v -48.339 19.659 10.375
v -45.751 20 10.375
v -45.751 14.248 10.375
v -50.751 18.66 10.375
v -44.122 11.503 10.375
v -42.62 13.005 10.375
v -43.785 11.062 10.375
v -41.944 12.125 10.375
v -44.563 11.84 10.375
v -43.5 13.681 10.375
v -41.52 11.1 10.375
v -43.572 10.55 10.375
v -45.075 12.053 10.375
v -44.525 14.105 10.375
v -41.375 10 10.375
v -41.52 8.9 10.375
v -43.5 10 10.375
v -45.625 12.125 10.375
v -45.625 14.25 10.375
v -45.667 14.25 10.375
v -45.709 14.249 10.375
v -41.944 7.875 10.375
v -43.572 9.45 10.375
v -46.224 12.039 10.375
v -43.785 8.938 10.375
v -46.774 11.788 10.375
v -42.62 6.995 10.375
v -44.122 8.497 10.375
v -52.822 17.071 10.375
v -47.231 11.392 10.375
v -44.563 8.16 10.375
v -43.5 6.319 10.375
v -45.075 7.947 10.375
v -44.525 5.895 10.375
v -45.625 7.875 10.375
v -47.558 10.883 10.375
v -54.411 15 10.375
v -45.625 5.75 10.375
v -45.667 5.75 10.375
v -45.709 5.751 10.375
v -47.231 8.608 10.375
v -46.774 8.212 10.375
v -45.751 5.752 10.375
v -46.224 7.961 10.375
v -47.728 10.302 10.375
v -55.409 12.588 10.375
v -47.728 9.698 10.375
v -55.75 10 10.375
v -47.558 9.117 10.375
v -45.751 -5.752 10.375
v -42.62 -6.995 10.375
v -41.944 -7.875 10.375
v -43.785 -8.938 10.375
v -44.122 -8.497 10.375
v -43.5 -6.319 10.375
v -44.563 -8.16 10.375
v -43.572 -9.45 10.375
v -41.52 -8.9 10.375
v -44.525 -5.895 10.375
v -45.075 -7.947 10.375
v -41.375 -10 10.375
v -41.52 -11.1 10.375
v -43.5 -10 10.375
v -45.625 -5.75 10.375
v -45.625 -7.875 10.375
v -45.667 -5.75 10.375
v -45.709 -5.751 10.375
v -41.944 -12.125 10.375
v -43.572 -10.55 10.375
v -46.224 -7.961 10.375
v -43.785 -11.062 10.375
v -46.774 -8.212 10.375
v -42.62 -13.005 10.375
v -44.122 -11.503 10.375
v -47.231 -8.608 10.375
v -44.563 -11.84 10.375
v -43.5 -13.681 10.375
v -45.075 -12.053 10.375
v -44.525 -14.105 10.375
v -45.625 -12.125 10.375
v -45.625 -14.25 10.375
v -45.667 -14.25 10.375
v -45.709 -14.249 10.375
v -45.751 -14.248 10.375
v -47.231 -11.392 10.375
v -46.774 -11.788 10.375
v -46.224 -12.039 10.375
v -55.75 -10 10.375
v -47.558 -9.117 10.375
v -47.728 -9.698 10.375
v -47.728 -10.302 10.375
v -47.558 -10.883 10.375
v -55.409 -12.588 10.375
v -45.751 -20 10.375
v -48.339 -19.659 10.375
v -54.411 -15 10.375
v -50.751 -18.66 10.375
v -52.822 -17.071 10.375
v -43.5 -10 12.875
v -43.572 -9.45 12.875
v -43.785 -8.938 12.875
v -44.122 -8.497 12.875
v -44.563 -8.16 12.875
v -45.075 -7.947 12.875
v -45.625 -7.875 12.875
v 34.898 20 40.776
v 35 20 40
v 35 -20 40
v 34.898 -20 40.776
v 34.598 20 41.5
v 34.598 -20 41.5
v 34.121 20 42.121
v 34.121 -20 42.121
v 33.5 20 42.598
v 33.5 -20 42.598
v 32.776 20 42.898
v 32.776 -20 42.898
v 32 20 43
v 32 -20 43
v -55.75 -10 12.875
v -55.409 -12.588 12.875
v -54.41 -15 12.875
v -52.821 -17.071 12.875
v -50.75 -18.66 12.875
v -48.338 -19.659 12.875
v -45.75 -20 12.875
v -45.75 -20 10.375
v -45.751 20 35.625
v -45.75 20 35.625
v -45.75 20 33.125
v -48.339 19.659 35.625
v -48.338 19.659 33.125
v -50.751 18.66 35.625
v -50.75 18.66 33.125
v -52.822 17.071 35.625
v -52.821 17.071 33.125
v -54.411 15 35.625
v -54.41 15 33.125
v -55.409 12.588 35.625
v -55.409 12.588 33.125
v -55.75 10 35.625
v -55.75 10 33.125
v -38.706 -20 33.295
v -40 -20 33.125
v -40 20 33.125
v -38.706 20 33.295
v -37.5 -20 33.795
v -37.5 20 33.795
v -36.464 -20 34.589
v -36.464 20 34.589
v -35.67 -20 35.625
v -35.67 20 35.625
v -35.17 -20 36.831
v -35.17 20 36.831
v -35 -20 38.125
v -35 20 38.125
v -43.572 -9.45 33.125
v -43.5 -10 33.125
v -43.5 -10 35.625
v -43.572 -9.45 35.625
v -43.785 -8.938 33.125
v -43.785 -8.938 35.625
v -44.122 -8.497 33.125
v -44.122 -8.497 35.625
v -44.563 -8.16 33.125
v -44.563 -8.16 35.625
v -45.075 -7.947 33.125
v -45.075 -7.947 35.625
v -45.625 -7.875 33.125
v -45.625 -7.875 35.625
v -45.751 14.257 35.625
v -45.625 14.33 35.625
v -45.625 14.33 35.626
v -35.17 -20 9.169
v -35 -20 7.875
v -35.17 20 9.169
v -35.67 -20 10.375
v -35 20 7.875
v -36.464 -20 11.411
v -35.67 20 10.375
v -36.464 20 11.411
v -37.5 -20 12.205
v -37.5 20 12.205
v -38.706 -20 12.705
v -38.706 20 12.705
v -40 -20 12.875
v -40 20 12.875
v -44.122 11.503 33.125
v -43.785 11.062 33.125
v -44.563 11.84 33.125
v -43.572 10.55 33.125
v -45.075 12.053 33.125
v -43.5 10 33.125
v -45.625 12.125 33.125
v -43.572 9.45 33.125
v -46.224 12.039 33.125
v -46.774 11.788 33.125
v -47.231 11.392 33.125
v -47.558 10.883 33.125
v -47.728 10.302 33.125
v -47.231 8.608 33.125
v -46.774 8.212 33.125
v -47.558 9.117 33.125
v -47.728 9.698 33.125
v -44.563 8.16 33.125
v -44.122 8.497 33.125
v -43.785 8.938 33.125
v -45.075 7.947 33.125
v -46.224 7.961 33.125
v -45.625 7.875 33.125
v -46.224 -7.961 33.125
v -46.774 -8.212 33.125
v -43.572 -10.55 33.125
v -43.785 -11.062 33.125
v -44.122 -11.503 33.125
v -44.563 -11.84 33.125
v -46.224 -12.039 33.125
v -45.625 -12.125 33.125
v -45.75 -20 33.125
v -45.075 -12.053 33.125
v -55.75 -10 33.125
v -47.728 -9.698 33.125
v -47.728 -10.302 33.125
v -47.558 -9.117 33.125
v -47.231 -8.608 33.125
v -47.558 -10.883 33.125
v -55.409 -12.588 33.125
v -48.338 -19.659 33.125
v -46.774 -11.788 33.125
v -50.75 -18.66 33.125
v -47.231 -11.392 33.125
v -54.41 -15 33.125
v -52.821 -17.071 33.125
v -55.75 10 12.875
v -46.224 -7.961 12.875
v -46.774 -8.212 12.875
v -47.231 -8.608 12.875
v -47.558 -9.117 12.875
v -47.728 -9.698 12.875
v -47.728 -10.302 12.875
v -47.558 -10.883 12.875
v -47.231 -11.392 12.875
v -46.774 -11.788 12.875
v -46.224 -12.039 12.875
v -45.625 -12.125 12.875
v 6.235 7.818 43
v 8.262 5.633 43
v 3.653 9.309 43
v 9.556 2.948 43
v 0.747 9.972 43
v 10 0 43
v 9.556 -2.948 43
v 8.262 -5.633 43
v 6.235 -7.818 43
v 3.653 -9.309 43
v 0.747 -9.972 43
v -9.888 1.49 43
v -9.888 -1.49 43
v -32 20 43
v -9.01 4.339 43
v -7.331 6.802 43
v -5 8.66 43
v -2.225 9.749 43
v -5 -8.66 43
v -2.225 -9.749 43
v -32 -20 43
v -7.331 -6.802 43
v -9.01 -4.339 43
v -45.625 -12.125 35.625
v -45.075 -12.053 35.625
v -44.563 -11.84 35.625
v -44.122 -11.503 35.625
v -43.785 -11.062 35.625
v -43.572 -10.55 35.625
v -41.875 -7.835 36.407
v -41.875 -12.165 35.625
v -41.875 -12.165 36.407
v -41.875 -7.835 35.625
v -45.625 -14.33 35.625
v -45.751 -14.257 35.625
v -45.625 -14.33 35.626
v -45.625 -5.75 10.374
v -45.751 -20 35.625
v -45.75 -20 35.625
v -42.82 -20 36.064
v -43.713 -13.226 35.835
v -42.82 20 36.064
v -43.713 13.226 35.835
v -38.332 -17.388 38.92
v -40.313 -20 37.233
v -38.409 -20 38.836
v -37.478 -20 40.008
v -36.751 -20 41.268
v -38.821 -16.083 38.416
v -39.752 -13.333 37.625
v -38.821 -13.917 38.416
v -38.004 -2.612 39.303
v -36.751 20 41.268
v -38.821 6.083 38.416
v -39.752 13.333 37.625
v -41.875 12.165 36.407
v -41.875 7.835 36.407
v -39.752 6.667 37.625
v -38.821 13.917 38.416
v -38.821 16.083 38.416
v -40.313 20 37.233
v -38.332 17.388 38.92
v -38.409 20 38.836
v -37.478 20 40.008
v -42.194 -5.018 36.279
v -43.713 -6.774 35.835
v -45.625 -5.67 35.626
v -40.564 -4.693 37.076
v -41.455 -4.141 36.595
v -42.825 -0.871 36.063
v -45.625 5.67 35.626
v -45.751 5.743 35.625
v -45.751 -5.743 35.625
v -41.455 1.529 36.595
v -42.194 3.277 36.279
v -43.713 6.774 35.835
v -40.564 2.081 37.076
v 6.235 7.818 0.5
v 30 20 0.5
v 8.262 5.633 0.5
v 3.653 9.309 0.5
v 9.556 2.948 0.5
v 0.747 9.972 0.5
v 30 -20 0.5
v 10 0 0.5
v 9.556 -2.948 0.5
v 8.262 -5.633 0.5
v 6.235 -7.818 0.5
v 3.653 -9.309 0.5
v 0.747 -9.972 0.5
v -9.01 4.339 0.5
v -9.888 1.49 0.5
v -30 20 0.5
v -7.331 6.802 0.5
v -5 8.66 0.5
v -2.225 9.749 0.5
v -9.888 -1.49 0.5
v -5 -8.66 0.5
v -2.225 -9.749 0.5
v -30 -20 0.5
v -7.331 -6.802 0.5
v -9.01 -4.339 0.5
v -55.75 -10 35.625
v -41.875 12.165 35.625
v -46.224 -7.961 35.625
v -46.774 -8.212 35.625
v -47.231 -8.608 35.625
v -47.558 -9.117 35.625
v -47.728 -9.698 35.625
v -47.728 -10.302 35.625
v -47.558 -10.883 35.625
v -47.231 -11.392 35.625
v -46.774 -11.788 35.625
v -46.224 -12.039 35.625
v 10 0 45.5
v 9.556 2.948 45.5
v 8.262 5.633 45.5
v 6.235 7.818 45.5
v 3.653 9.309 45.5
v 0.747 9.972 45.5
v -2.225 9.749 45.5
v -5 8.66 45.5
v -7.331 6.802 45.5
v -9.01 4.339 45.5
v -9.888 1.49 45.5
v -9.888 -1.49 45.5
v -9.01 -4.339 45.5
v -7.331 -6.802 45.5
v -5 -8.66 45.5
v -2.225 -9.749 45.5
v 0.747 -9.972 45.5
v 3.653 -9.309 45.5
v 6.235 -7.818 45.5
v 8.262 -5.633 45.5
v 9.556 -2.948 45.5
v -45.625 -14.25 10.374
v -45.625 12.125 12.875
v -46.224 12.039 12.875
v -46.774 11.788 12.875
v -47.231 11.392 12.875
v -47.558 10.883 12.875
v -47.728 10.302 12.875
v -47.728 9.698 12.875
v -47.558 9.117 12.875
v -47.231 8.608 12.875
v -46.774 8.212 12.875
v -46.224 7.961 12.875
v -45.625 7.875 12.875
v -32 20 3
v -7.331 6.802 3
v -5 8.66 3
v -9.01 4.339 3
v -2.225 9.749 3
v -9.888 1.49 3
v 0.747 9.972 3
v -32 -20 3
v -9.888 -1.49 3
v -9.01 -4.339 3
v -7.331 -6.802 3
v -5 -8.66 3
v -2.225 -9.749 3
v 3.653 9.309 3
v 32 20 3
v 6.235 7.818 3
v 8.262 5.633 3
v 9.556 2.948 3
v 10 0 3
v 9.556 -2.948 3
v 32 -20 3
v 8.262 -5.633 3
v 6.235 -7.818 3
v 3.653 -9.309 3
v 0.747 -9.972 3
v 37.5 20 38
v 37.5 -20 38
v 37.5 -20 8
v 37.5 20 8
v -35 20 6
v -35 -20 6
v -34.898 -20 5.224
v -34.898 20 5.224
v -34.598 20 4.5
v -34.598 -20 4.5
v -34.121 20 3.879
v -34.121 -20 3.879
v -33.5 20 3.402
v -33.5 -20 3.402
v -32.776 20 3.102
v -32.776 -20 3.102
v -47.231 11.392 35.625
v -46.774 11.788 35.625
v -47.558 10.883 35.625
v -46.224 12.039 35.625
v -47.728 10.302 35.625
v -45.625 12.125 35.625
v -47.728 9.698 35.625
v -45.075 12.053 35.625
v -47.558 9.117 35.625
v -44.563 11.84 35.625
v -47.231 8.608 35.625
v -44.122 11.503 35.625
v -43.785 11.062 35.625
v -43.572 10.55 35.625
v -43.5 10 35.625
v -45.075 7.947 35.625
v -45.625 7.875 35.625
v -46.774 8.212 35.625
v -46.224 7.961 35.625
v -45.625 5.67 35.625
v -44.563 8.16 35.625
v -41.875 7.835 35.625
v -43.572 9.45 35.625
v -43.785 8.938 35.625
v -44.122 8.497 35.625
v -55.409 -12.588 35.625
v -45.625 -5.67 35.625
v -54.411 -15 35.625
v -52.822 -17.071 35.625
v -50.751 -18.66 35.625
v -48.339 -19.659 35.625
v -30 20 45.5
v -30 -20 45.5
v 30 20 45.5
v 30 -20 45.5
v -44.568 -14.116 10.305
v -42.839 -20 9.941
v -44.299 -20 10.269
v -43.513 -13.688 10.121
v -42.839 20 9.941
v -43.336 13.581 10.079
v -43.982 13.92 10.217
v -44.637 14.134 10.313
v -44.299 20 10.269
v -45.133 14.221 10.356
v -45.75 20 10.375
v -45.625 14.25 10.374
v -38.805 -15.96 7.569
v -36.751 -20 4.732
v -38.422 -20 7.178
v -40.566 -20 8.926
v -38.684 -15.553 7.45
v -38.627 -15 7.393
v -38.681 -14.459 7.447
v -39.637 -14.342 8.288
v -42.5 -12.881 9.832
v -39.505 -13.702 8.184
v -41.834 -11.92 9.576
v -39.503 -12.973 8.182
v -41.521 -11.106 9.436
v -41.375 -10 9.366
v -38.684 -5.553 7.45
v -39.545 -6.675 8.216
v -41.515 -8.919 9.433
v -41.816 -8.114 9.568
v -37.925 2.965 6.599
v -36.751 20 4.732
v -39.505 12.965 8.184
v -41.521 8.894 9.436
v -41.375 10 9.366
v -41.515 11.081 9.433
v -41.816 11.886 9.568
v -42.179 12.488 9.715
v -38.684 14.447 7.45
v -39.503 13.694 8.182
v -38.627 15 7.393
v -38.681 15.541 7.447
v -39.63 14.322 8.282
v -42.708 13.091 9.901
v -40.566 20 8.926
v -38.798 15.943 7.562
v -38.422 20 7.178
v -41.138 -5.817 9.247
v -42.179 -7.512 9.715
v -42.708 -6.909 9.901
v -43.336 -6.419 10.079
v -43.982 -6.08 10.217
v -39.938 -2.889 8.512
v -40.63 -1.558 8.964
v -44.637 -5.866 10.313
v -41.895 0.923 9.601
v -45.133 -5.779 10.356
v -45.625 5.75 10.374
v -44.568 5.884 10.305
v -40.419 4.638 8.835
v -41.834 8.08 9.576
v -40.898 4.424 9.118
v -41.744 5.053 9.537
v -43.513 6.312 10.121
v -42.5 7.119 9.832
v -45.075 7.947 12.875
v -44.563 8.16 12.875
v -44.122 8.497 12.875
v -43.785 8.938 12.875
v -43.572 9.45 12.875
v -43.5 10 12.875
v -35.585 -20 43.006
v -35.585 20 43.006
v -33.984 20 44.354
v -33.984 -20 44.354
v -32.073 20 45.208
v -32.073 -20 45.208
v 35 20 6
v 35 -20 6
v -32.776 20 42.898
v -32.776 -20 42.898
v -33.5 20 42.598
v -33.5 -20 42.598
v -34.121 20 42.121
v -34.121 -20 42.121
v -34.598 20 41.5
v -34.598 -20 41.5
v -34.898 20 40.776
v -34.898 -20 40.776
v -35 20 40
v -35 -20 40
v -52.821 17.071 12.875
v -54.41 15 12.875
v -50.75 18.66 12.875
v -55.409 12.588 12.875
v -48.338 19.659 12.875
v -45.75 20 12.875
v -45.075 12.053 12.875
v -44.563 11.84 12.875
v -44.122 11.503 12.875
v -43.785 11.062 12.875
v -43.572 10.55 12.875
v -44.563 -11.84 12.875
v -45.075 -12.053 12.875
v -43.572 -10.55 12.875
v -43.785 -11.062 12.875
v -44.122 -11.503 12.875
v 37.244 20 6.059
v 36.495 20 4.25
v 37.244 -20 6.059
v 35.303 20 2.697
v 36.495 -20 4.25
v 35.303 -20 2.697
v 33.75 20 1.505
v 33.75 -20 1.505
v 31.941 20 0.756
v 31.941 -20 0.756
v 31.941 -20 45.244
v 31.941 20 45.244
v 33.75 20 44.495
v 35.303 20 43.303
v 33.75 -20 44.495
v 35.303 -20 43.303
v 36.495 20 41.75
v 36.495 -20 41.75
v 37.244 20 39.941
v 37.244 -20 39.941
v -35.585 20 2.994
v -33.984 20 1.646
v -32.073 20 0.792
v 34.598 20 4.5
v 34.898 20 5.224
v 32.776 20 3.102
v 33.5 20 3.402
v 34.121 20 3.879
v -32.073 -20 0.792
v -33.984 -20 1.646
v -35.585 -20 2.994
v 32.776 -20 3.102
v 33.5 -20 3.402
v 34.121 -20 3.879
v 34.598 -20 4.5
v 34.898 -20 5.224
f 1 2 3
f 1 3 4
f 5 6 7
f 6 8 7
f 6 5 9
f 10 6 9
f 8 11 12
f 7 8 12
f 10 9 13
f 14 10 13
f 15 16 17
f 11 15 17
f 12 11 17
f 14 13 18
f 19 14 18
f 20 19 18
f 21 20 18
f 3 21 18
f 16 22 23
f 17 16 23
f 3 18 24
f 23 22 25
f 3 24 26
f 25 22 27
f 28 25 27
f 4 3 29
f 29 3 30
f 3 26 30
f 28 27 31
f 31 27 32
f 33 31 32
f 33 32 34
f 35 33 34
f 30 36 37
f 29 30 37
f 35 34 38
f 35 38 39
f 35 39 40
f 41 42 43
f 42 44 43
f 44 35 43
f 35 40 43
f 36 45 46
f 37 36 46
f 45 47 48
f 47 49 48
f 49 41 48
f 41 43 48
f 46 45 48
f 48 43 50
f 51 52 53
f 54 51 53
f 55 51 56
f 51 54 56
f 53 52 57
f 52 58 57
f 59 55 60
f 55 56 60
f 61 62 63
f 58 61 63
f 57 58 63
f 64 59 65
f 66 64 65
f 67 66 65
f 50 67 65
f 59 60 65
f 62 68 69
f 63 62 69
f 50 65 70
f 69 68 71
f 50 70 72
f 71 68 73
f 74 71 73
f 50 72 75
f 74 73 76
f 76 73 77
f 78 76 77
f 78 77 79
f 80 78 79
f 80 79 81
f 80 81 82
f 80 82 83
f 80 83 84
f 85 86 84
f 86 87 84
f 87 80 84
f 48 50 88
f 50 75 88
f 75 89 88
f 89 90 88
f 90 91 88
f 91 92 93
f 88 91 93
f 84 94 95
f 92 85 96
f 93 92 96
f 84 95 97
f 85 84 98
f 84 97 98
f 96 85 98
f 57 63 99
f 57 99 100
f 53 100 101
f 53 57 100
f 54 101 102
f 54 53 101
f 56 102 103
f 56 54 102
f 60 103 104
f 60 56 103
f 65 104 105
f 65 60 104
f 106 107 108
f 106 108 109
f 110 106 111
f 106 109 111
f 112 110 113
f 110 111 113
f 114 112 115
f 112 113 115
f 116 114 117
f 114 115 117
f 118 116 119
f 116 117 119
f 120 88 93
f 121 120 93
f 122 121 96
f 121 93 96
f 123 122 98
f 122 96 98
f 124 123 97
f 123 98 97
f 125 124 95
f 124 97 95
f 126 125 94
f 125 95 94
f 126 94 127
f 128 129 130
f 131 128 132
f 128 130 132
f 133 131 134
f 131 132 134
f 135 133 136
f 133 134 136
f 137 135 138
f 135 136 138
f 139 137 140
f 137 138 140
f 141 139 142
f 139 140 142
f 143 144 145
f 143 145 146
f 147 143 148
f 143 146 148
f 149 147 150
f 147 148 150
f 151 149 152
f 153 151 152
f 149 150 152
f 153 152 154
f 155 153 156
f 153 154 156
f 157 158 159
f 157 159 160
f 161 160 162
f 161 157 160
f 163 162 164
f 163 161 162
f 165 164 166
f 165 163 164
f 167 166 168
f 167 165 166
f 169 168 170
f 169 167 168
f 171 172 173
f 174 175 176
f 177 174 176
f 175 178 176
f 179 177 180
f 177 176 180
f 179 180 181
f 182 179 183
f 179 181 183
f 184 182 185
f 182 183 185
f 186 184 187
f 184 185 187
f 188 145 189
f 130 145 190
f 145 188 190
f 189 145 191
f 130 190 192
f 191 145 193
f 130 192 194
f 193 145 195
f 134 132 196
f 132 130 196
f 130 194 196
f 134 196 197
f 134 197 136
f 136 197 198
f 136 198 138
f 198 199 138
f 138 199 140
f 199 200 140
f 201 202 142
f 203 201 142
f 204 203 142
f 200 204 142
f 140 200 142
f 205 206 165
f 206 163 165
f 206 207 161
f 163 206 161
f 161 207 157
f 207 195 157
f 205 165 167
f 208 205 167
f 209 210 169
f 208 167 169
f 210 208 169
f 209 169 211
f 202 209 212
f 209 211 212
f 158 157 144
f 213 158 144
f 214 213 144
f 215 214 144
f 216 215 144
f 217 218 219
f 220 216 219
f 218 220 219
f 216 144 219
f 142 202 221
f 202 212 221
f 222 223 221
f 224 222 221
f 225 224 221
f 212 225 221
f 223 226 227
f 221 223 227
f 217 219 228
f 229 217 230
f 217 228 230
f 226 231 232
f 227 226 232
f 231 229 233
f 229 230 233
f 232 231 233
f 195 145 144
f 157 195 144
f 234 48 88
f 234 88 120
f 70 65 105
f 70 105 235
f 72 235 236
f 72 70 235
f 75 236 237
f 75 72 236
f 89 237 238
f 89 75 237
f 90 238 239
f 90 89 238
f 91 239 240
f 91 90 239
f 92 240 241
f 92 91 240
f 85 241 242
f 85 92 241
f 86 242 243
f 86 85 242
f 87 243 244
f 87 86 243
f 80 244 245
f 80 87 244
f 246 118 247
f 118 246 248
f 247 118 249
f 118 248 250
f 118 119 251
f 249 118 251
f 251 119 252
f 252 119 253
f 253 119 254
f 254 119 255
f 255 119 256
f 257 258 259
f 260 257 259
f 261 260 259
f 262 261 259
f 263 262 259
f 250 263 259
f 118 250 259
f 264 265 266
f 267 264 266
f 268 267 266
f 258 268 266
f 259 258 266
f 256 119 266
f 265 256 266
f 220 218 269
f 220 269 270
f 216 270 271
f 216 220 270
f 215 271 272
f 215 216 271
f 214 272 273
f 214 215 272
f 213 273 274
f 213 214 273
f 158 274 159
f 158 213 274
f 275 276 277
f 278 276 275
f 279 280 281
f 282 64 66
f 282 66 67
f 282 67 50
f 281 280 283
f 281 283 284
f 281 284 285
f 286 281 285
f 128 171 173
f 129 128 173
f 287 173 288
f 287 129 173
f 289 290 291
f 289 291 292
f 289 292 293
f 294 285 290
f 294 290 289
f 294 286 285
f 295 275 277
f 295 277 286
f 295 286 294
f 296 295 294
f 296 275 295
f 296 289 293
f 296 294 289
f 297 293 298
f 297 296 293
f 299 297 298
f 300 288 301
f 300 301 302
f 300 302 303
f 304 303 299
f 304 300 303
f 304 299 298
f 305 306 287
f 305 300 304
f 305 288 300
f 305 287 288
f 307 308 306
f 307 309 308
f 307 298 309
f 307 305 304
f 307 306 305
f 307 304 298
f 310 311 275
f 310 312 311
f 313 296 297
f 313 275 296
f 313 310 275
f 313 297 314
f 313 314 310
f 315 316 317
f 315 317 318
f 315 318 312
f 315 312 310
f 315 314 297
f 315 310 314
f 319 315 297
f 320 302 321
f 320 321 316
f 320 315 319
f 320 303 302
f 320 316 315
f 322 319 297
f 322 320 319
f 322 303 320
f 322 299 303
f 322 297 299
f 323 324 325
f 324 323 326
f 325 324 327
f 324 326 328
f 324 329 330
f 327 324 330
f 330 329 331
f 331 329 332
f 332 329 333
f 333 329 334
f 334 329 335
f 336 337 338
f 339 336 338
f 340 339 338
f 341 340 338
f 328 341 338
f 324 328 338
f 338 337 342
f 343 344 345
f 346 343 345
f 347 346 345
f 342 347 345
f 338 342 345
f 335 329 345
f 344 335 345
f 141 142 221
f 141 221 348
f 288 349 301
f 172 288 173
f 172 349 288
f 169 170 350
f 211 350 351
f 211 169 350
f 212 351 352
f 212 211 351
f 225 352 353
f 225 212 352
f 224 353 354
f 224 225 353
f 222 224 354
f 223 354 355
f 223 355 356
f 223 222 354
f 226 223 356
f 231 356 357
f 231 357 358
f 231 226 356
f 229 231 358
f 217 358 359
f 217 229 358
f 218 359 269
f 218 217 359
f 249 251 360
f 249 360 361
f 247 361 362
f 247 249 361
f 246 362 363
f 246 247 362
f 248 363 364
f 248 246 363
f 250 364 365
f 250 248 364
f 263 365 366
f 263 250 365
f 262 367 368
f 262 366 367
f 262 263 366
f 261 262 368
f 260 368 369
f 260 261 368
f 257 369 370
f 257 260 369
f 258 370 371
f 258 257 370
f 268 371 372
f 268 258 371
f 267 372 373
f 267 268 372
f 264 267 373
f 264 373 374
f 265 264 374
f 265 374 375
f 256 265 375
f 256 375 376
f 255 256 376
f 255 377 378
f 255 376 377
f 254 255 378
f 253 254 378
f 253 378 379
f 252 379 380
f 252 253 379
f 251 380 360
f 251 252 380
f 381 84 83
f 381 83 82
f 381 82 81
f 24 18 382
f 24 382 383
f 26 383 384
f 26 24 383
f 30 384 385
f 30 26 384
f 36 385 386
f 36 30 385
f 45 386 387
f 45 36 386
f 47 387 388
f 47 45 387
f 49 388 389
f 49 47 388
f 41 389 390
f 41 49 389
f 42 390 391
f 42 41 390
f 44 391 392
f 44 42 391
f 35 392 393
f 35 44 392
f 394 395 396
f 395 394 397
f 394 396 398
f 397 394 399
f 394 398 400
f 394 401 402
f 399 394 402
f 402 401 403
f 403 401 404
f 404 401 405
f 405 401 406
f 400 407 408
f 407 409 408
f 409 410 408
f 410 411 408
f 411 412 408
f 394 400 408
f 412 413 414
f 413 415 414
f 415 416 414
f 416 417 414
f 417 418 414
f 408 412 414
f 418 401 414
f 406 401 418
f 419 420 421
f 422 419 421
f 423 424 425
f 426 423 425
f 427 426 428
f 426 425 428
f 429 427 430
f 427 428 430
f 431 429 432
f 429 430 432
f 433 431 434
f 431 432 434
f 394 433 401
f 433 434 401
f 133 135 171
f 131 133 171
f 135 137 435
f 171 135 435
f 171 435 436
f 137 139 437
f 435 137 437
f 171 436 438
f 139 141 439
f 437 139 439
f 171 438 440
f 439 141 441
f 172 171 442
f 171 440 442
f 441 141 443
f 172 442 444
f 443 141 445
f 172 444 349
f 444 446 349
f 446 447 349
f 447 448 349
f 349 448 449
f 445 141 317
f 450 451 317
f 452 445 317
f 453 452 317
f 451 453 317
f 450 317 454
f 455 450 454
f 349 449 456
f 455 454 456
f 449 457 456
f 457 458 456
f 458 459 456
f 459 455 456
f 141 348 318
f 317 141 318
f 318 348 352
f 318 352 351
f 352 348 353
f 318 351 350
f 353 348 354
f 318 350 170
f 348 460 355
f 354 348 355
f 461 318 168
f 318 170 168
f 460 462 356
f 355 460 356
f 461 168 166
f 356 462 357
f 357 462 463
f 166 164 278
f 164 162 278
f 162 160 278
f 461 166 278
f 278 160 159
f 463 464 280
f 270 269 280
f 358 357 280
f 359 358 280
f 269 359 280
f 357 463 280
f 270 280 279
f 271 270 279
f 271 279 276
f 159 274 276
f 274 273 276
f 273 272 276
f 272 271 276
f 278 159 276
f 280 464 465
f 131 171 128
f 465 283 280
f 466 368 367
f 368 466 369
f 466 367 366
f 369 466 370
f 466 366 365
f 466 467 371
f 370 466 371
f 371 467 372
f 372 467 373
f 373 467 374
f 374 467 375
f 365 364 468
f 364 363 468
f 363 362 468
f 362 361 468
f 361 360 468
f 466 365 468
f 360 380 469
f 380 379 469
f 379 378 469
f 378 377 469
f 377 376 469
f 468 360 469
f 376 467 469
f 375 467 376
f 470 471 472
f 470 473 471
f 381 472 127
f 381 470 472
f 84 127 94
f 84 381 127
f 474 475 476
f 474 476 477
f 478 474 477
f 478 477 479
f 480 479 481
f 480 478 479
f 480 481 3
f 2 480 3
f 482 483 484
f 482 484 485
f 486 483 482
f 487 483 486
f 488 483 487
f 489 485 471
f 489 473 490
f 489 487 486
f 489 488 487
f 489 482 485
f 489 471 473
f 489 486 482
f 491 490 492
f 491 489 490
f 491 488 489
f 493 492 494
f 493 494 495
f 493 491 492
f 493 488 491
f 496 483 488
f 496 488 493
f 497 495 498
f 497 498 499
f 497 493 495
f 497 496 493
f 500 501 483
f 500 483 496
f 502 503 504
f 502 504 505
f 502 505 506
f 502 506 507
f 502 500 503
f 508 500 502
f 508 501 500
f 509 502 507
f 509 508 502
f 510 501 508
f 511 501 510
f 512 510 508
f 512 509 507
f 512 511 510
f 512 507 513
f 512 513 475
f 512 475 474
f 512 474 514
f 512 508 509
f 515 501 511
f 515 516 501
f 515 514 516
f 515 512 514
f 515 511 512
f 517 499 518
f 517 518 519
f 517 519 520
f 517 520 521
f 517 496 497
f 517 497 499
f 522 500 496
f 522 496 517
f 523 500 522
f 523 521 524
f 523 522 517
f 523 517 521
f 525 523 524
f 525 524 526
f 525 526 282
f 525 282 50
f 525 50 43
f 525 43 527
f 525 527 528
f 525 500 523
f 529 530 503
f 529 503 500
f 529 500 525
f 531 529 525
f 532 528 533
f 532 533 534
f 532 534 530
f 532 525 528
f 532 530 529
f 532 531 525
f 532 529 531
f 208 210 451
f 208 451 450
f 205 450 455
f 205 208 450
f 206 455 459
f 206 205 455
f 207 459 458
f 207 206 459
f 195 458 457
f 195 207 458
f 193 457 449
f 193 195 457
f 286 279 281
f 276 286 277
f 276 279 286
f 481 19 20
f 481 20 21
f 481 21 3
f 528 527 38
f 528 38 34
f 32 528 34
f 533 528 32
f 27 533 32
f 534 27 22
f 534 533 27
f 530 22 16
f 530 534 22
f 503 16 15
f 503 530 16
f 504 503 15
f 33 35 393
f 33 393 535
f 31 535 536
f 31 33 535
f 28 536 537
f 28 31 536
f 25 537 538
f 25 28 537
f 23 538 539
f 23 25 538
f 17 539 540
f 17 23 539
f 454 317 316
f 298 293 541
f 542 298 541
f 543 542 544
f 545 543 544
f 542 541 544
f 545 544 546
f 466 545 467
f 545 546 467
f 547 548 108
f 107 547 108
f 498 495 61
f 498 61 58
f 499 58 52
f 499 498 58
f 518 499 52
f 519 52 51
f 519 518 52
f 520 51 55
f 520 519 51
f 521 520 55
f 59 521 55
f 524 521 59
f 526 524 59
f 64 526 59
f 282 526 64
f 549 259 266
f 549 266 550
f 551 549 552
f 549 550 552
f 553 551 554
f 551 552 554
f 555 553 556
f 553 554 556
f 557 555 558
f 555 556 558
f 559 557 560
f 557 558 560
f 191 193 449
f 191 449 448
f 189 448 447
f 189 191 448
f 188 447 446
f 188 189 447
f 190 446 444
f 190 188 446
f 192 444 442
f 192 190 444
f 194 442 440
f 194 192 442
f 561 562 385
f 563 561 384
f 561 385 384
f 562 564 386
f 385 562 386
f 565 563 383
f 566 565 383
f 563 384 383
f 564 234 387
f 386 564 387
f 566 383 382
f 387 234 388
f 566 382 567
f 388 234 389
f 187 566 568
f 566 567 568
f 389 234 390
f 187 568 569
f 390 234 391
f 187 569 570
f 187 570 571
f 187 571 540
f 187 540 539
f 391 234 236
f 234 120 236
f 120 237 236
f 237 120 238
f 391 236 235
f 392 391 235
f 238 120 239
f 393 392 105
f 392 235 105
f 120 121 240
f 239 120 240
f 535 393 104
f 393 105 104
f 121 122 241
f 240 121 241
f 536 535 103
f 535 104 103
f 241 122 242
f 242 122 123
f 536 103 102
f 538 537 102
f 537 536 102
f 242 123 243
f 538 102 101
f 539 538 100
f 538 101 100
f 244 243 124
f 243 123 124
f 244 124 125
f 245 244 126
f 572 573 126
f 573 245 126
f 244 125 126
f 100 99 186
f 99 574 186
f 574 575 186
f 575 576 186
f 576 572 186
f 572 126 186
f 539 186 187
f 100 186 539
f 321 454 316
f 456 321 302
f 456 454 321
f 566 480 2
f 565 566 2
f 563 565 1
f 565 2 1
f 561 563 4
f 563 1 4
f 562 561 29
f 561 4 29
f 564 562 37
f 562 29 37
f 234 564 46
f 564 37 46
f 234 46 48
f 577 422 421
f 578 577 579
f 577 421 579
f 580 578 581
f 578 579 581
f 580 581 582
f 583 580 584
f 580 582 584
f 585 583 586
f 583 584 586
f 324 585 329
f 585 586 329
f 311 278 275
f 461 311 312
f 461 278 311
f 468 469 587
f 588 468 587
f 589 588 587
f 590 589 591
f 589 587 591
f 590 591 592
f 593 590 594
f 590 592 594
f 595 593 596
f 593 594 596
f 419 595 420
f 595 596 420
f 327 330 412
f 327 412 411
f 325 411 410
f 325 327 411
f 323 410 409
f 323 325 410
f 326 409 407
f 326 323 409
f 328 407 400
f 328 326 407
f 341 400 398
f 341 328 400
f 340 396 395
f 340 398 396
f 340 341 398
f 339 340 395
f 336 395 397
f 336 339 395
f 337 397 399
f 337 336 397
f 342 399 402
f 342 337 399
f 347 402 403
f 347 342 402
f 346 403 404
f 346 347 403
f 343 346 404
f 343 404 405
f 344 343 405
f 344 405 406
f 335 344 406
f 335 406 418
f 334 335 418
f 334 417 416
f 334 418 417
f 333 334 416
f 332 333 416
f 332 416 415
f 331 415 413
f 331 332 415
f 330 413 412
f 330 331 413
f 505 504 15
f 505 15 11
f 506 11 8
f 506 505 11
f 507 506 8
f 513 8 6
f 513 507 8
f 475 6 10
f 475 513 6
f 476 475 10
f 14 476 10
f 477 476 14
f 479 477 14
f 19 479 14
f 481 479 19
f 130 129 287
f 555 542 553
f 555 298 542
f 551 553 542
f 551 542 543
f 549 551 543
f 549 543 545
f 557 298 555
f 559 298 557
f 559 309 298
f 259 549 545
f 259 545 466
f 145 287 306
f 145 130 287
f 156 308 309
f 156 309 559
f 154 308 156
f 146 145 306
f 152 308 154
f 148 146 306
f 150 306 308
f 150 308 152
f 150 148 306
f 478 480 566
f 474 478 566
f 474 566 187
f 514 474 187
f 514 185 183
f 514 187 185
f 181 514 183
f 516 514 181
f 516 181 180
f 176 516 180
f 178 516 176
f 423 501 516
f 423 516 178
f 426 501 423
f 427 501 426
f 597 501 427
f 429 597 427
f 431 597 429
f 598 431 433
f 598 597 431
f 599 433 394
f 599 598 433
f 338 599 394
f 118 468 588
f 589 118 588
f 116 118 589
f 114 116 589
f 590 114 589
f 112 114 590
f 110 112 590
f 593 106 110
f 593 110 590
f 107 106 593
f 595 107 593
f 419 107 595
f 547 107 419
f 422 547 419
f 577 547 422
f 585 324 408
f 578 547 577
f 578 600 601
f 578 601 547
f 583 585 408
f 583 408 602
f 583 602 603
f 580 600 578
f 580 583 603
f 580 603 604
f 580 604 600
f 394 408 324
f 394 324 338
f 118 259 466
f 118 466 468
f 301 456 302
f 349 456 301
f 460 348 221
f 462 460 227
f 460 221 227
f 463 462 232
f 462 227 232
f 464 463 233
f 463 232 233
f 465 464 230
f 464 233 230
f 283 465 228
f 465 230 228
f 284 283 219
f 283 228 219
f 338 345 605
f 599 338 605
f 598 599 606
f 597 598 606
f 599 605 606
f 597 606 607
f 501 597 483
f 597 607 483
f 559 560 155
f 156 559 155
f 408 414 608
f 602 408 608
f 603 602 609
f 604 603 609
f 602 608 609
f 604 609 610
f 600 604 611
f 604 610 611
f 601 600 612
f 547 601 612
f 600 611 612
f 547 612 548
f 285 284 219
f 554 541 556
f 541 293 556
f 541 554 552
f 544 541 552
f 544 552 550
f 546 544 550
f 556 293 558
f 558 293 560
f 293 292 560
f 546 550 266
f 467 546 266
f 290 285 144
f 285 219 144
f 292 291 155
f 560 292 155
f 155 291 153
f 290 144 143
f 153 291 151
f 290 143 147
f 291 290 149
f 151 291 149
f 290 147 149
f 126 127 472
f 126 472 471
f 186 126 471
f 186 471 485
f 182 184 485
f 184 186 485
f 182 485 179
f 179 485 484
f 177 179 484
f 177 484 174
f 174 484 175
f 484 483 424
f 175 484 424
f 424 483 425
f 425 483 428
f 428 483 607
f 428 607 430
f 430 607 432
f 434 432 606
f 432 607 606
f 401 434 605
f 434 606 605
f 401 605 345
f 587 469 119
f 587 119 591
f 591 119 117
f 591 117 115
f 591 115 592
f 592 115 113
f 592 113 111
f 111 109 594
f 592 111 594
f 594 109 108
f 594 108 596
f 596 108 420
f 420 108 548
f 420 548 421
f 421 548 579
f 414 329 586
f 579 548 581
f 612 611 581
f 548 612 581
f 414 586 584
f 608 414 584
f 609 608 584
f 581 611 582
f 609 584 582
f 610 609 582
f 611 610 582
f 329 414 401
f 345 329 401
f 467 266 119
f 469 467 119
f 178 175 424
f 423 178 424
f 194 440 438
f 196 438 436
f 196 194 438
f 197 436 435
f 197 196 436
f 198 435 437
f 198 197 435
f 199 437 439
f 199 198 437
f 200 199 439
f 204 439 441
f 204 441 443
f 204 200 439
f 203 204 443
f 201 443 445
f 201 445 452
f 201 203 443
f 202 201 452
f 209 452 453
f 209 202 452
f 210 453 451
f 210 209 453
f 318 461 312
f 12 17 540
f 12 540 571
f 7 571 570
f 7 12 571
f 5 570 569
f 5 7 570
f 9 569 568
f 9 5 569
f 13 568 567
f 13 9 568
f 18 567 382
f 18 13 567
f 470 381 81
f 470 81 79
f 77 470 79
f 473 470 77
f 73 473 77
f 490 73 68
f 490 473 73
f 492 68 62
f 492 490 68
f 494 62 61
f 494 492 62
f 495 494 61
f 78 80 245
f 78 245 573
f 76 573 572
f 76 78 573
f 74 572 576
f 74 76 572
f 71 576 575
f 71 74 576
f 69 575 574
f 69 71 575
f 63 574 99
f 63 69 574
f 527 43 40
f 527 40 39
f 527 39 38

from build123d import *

# Parameters (mm, degrees)
BOSS_EXTRUDE1_DEPTH                 = 20
BOSS_EXTRUDE1_DEPTH_BACK            = 20
FILLET1_R                           = 10
CUT_EXTRUDE1_DEPTH                  = 75.688101624
CUT_EXTRUDE1_DEPTH_BACK             = 75.688101624
CUT_EXTRUDE2_DEPTH                  = 10.375
CUT_EXTRUDE2_DIRECTION_2_REACH      = 76.688
CUT_EXTRUDE2_DIRECTION_2_END_RADIUS = 10
FILLET2_R                           = 10
FILLET3_R                           = 5
CUT_EXTRUDE3_DEPTH                  = 20
CUT_EXTRUDE4_DEPTH                  = 75.384558372
CUT_EXTRUDE4_DEPTH_BACK             = 75.384558372
SKETCH4_R                           = 10


with BuildPart() as part:
    # Sketch1 → Boss-Extrude1 (new, two sides: drawn at the far end of the back side and taken through both)
    with BuildSketch(Plane(origin=(0, 0, 0), x_dir=(1, 0, 0), z_dir=(0, 1, 0)).offset(-BOSS_EXTRUDE1_DEPTH_BACK)):
        with BuildLine():
            Line((-35, -33.125), (-55.75, -33.125))
            Line((-55.75, -33.125), (-55.75, -35.625))
            Line((-55.75, -35.625), (-37.5, -35.625))
            Line((-37.5, -35.625), (-37.5, -38))
            ThreePointArc((-37.5, -38), (-35.303300859, -43.303300859), (-30, -45.5))
            Line((-30, -45.5), (30, -45.5))
            ThreePointArc((30, -45.5), (35.303300859, -43.303300859), (37.5, -38))
            Line((37.5, -38), (37.5, -8))
            ThreePointArc((37.5, -8), (35.303300859, -2.696699141), (30, -0.5))
            Line((30, -0.5), (-30, -0.5))
            ThreePointArc((-30, -0.5), (-35.303300859, -2.696699141), (-37.5, -8))
            Line((-37.5, -8), (-37.5, -10.375))
            Line((-37.5, -10.375), (-55.75, -10.375))
            Line((-55.75, -10.375), (-55.75, -12.875))
            Line((-55.75, -12.875), (-35, -12.875))
            Line((-35, -12.875), (-35, -6))
            ThreePointArc((-35, -6), (-34.121320344, -3.878679656), (-32, -3))
            Line((-32, -3), (32, -3))
            ThreePointArc((32, -3), (34.121320344, -3.878679656), (35, -6))
            Line((35, -6), (35, -40))
            ThreePointArc((35, -40), (34.121320344, -42.121320344), (32, -43))
            Line((32, -43), (-32, -43))
            ThreePointArc((-32, -43), (-34.121320344, -42.121320344), (-35, -40))
            Line((-35, -40), (-35, -33.125))
        make_face()
    extrude(amount=BOSS_EXTRUDE1_DEPTH + BOSS_EXTRUDE1_DEPTH_BACK)

    # Fillet1
    fillet1_edges = [part.edges().sort_by_distance(p)[0] for p in [
        (-37.5, 0, 10.375),
        (-37.5, 0, 35.625),
    ]]
    fillet(fillet1_edges, radius=FILLET1_R)

    # Sketch2 → Cut-Extrude1 (cut, two sides: drawn at the far end of the back side and taken through both)
    with BuildSketch(Plane.XY.offset(-CUT_EXTRUDE1_DEPTH_BACK)):
        with BuildLine():
            ThreePointArc((-43.5, -10), (-44.12239809, -8.49739809), (-45.625, -7.875))
            Line((-45.625, -7.875), (-45.625, -12.125))
            ThreePointArc((-45.625, -12.125), (-44.12239809, -11.50260191), (-43.5, -10))
        make_face()
        with BuildLine():
            Line((-45.625, -12.125), (-45.625, -7.875))
            ThreePointArc((-45.625, -7.875), (-47.75, -10), (-45.625, -12.125))
        make_face()
        with BuildLine():
            ThreePointArc((-43.5, 10), (-44.12239809, 11.50260191), (-45.625, 12.125))
            Line((-45.625, 12.125), (-45.625, 7.875))
            ThreePointArc((-45.625, 7.875), (-44.12239809, 8.49739809), (-43.5, 10))
        make_face()
        with BuildLine():
            Line((-45.625, 7.875), (-45.625, 12.125))
            ThreePointArc((-45.625, 12.125), (-47.75, 10), (-45.625, 7.875))
        make_face()
    extrude(amount=CUT_EXTRUDE1_DEPTH + CUT_EXTRUDE1_DEPTH_BACK, mode=Mode.SUBTRACT)

    # Sketch2<4> → Cut-Extrude2 (cut)
    with BuildSketch(Plane.XY):
        with BuildLine():
            ThreePointArc((-41.375, 10), (-42.61979618, 13.00520382), (-45.625, 14.25))
            Line((-45.625, 14.25), (-45.625, 12.125))
            ThreePointArc((-45.625, 12.125), (-44.12239809, 11.50260191), (-43.5, 10))
            ThreePointArc((-43.5, 10), (-44.12239809, 8.49739809), (-45.625, 7.875))
            Line((-45.625, 7.875), (-45.625, 5.75))
            ThreePointArc((-45.625, 5.75), (-42.61979618, 6.99479618), (-41.375, 10))
        make_face()
        with BuildLine():
            Line((-45.625, 12.125), (-45.625, 14.25))
            ThreePointArc((-45.625, 14.25), (-49.875, 10), (-45.625, 5.75))
            Line((-45.625, 5.75), (-45.625, 7.875))
            ThreePointArc((-45.625, 7.875), (-47.75, 10), (-45.625, 12.125))
        make_face()
        with BuildLine():
            ThreePointArc((-41.375, -10), (-42.61979618, -6.99479618), (-45.625, -5.75))
            Line((-45.625, -5.75), (-45.625, -7.875))
            ThreePointArc((-45.625, -7.875), (-44.12239809, -8.49739809), (-43.5, -10))
            ThreePointArc((-43.5, -10), (-44.12239809, -11.50260191), (-45.625, -12.125))
            Line((-45.625, -12.125), (-45.625, -14.25))
            ThreePointArc((-45.625, -14.25), (-42.61979618, -13.00520382), (-41.375, -10))
        make_face()
        with BuildLine():
            Line((-45.625, -7.875), (-45.625, -5.75))
            ThreePointArc((-45.625, -5.75), (-49.875, -10), (-45.625, -14.25))
            Line((-45.625, -14.25), (-45.625, -12.125))
            ThreePointArc((-45.625, -12.125), (-47.75, -10), (-45.625, -7.875))
        make_face()
    extrude(amount=CUT_EXTRUDE2_DEPTH, mode=Mode.SUBTRACT)

    # Cut-Extrude2 direction 2: up to this cylinder (the profile starts inside it)
    cut_extrude2_direction_2_end = Plane(origin=(-45.751488025, -2.938005, 0.375), z_dir=(0, 1, 0)) * Cylinder(CUT_EXTRUDE2_DIRECTION_2_END_RADIUS, 194.376, mode=Mode.PRIVATE)
    # Sketch2<4> → Cut-Extrude2 direction 2 (cut, up to the surface)
    with BuildSketch(Plane.XY, mode=Mode.PRIVATE) as cut_extrude2_direction_2_sk1:
        with BuildLine():
            ThreePointArc((-41.375, 10), (-42.61979618, 13.00520382), (-45.625, 14.25))
            Line((-45.625, 14.25), (-45.625, 12.125))
            ThreePointArc((-45.625, 12.125), (-44.12239809, 11.50260191), (-43.5, 10))
            ThreePointArc((-43.5, 10), (-44.12239809, 8.49739809), (-45.625, 7.875))
            Line((-45.625, 7.875), (-45.625, 5.75))
            ThreePointArc((-45.625, 5.75), (-42.61979618, 6.99479618), (-41.375, 10))
        make_face()
    cut_extrude2_direction_2_tool1 = extrude(cut_extrude2_direction_2_sk1.sketch, amount=-CUT_EXTRUDE2_DIRECTION_2_REACH, mode=Mode.PRIVATE) & cut_extrude2_direction_2_end
    add(cut_extrude2_direction_2_tool1.solids().sort_by_distance((-42.686995, 7.061995, 0))[0], mode=Mode.SUBTRACT)
    # Sketch2<4> → Cut-Extrude2 direction 2 (cut, up to the surface)
    with BuildSketch(Plane.XY, mode=Mode.PRIVATE) as cut_extrude2_direction_2_sk2:
        with BuildLine():
            Line((-45.625, 12.125), (-45.625, 14.25))
            ThreePointArc((-45.625, 14.25), (-49.875, 10), (-45.625, 5.75))
            Line((-45.625, 5.75), (-45.625, 7.875))
            ThreePointArc((-45.625, 7.875), (-47.75, 10), (-45.625, 12.125))
        make_face()
    cut_extrude2_direction_2_tool2 = extrude(cut_extrude2_direction_2_sk2.sketch, amount=-CUT_EXTRUDE2_DIRECTION_2_REACH, mode=Mode.PRIVATE) & cut_extrude2_direction_2_end
    add(cut_extrude2_direction_2_tool2.solids().sort_by_distance((-45.720033, 6.8125, 0))[0], mode=Mode.SUBTRACT)
    # Sketch2<4> → Cut-Extrude2 direction 2 (cut, up to the surface)
    with BuildSketch(Plane.XY, mode=Mode.PRIVATE) as cut_extrude2_direction_2_sk3:
        with BuildLine():
            ThreePointArc((-41.375, -10), (-42.61979618, -6.99479618), (-45.625, -5.75))
            Line((-45.625, -5.75), (-45.625, -7.875))
            ThreePointArc((-45.625, -7.875), (-44.12239809, -8.49739809), (-43.5, -10))
            ThreePointArc((-43.5, -10), (-44.12239809, -11.50260191), (-45.625, -12.125))
            Line((-45.625, -12.125), (-45.625, -14.25))
            ThreePointArc((-45.625, -14.25), (-42.61979618, -13.00520382), (-41.375, -10))
        make_face()
    cut_extrude2_direction_2_tool3 = extrude(cut_extrude2_direction_2_sk3.sketch, amount=-CUT_EXTRUDE2_DIRECTION_2_REACH, mode=Mode.PRIVATE) & cut_extrude2_direction_2_end
    add(cut_extrude2_direction_2_tool3.solids().sort_by_distance((-42.686995, -12.938005, 0))[0], mode=Mode.SUBTRACT)
    # Sketch2<4> → Cut-Extrude2 direction 2 (cut, up to the surface)
    with BuildSketch(Plane.XY, mode=Mode.PRIVATE) as cut_extrude2_direction_2_sk4:
        with BuildLine():
            Line((-45.625, -7.875), (-45.625, -5.75))
            ThreePointArc((-45.625, -5.75), (-49.875, -10), (-45.625, -14.25))
            Line((-45.625, -14.25), (-45.625, -12.125))
            ThreePointArc((-45.625, -12.125), (-47.75, -10), (-45.625, -7.875))
        make_face()
    cut_extrude2_direction_2_tool4 = extrude(cut_extrude2_direction_2_sk4.sketch, amount=-CUT_EXTRUDE2_DIRECTION_2_REACH, mode=Mode.PRIVATE) & cut_extrude2_direction_2_end
    add(cut_extrude2_direction_2_tool4.solids().sort_by_distance((-49.779967, -10, 0))[0], mode=Mode.SUBTRACT)

    # Fillet2
    # the kernel refuses this fillet: 10 mm, written as the material it takes off along each edge
    with BuildSketch(Plane(origin=(-55.75, 20, -14.625), x_dir=(1, 0, 0), z_dir=(0, 0, 1)), Plane(origin=(-55.75, 20, 8.125), x_dir=(1, 0, 0), z_dir=(0, 0, 1))) as fillet2_piece_1:
        with BuildLine():
            CenterArc((FILLET2_R, -FILLET2_R), FILLET2_R, 90, 90)
            Line((0, -FILLET2_R), (0, 0))
            Line((0, 0), (FILLET2_R, 0))
        make_face()
    extrude(amount=52.5, mode=Mode.SUBTRACT)
    with BuildSketch(Plane(origin=(-55.75, -20, -14.625), x_dir=(1, 0, 0), z_dir=(0, 0, 1)), Plane(origin=(-55.75, -20, 8.125), x_dir=(1, 0, 0), z_dir=(0, 0, 1))) as fillet2_piece_2:
        with BuildLine():
            CenterArc((FILLET2_R, FILLET2_R), FILLET2_R, 180, 90)
            Line((0, FILLET2_R), (0, 0))
            Line((0, 0), (FILLET2_R, 0))
        make_face()
    extrude(amount=52.5, mode=Mode.SUBTRACT)

    # Fillet3
    fillet3_edges = [part.edges().sort_by_distance(p)[0] for p in [
        (-35, 0, 33.125),
        (-35, 0, 12.875),
    ]]
    fillet(fillet3_edges, radius=FILLET3_R)

    # Sketch3 → Cut-Extrude3 (cut)
    with BuildSketch(Plane.XY.offset(35.625)):
        Polygon((-45.625, 14.330127019), (-49.375, 12.165063509), (-49.375, 7.834936491), (-45.625, 5.669872981), (-41.875, 7.834936491), (-41.875, 12.165063509), align=None)
        Polygon((-45.625, -5.669872981), (-49.375, -7.834936491), (-49.375, -12.165063509), (-45.625, -14.330127019), (-41.875, -12.165063509), (-41.875, -7.834936491), align=None)
    extrude(amount=CUT_EXTRUDE3_DEPTH, mode=Mode.SUBTRACT)

    # Sketch4 → Cut-Extrude4 (cut, two sides: drawn at the far end of the back side and taken through both)
    with BuildSketch(Plane.XY.offset(45.5).offset(-CUT_EXTRUDE4_DEPTH_BACK)):
        Circle(SKETCH4_R)
    extrude(amount=CUT_EXTRUDE4_DEPTH + CUT_EXTRUDE4_DEPTH_BACK, mode=Mode.SUBTRACT)


solid = part.part
